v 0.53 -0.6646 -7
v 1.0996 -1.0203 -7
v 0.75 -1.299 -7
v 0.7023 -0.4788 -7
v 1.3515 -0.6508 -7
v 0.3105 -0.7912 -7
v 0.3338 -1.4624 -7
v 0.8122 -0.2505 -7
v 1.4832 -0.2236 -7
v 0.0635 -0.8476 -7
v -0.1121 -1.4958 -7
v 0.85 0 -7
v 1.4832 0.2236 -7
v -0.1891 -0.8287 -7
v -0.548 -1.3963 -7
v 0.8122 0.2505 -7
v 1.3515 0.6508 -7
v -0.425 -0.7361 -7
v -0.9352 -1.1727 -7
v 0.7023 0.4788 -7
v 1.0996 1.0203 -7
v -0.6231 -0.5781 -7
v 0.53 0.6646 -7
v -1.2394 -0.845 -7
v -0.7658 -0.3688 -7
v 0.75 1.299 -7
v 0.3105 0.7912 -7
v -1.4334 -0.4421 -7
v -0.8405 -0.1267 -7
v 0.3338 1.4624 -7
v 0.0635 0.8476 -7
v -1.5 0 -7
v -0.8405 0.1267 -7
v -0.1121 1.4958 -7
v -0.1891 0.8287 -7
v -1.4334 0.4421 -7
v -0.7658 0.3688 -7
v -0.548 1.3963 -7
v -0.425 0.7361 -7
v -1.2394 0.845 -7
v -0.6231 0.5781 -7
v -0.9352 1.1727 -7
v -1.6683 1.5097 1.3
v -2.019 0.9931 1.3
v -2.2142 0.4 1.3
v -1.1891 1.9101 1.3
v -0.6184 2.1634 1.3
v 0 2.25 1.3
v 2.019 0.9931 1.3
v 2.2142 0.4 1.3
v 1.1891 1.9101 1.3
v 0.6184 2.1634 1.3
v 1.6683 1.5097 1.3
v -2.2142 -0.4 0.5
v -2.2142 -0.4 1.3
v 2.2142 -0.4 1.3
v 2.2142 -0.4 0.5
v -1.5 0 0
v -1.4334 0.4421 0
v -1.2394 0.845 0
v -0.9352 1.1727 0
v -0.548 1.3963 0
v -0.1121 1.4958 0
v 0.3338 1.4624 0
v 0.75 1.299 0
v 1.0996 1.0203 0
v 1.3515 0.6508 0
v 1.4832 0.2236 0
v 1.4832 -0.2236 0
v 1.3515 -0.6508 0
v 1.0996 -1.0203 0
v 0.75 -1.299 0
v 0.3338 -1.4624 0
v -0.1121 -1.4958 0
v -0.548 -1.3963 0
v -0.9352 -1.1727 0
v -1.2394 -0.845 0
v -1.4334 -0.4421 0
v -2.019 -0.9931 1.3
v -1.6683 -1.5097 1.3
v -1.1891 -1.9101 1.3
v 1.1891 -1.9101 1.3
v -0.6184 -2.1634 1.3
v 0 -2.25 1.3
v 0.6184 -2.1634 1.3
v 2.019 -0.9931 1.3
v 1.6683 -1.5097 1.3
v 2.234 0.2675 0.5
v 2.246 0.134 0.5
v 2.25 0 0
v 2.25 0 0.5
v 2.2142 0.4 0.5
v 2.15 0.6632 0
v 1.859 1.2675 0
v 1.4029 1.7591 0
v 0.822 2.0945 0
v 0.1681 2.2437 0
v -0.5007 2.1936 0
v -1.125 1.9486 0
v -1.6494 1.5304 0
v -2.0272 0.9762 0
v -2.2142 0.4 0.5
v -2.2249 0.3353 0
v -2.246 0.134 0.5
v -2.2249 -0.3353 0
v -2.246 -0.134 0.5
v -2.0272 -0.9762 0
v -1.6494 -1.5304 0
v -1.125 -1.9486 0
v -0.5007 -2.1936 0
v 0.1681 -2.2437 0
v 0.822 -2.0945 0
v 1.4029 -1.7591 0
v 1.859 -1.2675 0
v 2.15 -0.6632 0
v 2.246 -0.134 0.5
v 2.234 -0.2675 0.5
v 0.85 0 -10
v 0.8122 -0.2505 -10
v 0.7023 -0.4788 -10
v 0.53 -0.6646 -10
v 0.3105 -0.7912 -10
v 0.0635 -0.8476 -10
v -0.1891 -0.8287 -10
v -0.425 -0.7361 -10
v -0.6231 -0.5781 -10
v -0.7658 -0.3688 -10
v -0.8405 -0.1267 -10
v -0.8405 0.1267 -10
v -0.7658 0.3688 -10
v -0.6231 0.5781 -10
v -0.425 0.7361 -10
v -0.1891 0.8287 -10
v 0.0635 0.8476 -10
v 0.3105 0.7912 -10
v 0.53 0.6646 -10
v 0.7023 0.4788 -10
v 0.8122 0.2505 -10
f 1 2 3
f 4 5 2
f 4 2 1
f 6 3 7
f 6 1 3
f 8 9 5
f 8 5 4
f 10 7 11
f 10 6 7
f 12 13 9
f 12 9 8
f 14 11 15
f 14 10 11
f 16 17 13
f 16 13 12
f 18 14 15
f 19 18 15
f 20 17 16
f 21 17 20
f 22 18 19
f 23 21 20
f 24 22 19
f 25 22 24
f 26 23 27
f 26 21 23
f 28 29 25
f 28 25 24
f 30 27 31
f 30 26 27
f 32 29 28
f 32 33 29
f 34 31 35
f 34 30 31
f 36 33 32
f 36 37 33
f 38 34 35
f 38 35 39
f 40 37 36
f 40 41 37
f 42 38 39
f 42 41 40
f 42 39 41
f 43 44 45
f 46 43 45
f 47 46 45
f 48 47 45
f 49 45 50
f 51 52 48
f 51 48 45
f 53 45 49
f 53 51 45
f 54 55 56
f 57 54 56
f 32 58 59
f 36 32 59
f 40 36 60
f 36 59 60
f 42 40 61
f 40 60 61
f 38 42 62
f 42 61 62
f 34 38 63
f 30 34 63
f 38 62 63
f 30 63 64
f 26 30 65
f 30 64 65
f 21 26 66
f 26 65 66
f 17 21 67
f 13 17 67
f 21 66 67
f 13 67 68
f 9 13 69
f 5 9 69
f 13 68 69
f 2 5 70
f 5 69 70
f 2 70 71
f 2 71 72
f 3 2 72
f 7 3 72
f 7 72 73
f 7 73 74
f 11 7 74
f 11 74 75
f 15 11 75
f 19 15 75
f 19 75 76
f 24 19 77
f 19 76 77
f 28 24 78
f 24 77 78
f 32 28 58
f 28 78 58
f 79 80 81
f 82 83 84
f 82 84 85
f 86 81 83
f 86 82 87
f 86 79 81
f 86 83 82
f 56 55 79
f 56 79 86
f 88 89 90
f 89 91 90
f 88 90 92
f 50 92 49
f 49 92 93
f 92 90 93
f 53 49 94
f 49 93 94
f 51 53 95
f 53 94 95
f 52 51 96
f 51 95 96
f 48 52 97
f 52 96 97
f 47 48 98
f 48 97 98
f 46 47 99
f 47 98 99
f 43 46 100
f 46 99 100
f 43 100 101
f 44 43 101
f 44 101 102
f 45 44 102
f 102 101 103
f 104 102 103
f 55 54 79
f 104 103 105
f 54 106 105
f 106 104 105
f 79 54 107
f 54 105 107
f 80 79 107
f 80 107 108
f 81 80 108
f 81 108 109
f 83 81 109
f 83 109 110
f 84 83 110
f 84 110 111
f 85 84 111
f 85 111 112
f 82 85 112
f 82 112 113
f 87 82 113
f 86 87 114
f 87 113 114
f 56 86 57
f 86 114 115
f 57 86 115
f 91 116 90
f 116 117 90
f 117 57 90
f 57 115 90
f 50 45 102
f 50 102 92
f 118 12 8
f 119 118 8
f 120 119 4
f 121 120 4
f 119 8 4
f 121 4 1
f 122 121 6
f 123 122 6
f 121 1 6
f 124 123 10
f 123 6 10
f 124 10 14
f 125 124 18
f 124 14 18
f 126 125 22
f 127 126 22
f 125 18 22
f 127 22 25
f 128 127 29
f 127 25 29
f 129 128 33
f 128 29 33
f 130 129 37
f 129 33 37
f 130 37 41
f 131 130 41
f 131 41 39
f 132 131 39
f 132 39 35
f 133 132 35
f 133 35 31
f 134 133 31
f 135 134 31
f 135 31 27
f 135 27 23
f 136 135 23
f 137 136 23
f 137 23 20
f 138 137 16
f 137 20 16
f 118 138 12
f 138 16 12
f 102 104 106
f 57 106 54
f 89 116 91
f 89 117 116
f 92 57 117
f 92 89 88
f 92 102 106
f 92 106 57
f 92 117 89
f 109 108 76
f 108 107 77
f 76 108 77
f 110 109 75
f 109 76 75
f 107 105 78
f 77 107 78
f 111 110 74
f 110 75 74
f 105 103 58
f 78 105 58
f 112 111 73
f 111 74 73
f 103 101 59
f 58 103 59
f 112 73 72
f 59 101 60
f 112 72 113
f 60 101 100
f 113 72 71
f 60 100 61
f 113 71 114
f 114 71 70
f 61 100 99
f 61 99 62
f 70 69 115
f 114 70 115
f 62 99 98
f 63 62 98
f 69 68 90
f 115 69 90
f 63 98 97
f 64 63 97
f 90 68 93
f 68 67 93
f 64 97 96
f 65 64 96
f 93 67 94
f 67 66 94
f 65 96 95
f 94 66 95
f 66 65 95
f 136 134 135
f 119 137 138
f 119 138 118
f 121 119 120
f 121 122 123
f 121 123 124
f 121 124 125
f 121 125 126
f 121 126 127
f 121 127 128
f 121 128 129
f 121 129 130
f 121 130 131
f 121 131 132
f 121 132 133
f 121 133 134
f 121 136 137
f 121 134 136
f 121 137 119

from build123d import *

# Parameters (mm, degrees)
SKETCH2_R           = 2.25
BOSS_EXTRUDE1_DEPTH = 1.3
SKETCH3_W           = 4.890037446
SKETCH3_H           = 0.8
CUT_EXTRUDE1_DEPTH  = 0.8
SKETCH4_R           = 1.5
BOSS_EXTRUDE2_DEPTH = 7
SKETCH5_R           = 0.85
BOSS_EXTRUDE3_DEPTH = 3


with BuildPart() as part:
    # Sketch2 → Boss-Extrude1 (new body)
    with BuildSketch(Plane.XY):
        Circle(SKETCH2_R)
    extrude(amount=BOSS_EXTRUDE1_DEPTH)

    # Sketch3 → Cut-Extrude1 (cut)
    with BuildSketch(Plane.XY.offset(1.3)):
        Rectangle(SKETCH3_W, SKETCH3_H)
    extrude(amount=-CUT_EXTRUDE1_DEPTH, mode=Mode.SUBTRACT)

    # Sketch4 → Boss-Extrude2 (add)
    with BuildSketch(Plane(origin=(0, 0, 0), x_dir=(-1, 0, 0), z_dir=(0, 0, -1))):
        Circle(SKETCH4_R)
    extrude(amount=BOSS_EXTRUDE2_DEPTH)

    # Sketch5 → Boss-Extrude3 (add)
    with BuildSketch(Plane(origin=(0, 0, -7), x_dir=(-1, 0, 0), z_dir=(0, 0, -1))):
        with Locations(Location((0, 0, 0), (0, 0, 180))):
            Circle(SKETCH5_R)
    extrude(amount=BOSS_EXTRUDE3_DEPTH)


solid = part.part
